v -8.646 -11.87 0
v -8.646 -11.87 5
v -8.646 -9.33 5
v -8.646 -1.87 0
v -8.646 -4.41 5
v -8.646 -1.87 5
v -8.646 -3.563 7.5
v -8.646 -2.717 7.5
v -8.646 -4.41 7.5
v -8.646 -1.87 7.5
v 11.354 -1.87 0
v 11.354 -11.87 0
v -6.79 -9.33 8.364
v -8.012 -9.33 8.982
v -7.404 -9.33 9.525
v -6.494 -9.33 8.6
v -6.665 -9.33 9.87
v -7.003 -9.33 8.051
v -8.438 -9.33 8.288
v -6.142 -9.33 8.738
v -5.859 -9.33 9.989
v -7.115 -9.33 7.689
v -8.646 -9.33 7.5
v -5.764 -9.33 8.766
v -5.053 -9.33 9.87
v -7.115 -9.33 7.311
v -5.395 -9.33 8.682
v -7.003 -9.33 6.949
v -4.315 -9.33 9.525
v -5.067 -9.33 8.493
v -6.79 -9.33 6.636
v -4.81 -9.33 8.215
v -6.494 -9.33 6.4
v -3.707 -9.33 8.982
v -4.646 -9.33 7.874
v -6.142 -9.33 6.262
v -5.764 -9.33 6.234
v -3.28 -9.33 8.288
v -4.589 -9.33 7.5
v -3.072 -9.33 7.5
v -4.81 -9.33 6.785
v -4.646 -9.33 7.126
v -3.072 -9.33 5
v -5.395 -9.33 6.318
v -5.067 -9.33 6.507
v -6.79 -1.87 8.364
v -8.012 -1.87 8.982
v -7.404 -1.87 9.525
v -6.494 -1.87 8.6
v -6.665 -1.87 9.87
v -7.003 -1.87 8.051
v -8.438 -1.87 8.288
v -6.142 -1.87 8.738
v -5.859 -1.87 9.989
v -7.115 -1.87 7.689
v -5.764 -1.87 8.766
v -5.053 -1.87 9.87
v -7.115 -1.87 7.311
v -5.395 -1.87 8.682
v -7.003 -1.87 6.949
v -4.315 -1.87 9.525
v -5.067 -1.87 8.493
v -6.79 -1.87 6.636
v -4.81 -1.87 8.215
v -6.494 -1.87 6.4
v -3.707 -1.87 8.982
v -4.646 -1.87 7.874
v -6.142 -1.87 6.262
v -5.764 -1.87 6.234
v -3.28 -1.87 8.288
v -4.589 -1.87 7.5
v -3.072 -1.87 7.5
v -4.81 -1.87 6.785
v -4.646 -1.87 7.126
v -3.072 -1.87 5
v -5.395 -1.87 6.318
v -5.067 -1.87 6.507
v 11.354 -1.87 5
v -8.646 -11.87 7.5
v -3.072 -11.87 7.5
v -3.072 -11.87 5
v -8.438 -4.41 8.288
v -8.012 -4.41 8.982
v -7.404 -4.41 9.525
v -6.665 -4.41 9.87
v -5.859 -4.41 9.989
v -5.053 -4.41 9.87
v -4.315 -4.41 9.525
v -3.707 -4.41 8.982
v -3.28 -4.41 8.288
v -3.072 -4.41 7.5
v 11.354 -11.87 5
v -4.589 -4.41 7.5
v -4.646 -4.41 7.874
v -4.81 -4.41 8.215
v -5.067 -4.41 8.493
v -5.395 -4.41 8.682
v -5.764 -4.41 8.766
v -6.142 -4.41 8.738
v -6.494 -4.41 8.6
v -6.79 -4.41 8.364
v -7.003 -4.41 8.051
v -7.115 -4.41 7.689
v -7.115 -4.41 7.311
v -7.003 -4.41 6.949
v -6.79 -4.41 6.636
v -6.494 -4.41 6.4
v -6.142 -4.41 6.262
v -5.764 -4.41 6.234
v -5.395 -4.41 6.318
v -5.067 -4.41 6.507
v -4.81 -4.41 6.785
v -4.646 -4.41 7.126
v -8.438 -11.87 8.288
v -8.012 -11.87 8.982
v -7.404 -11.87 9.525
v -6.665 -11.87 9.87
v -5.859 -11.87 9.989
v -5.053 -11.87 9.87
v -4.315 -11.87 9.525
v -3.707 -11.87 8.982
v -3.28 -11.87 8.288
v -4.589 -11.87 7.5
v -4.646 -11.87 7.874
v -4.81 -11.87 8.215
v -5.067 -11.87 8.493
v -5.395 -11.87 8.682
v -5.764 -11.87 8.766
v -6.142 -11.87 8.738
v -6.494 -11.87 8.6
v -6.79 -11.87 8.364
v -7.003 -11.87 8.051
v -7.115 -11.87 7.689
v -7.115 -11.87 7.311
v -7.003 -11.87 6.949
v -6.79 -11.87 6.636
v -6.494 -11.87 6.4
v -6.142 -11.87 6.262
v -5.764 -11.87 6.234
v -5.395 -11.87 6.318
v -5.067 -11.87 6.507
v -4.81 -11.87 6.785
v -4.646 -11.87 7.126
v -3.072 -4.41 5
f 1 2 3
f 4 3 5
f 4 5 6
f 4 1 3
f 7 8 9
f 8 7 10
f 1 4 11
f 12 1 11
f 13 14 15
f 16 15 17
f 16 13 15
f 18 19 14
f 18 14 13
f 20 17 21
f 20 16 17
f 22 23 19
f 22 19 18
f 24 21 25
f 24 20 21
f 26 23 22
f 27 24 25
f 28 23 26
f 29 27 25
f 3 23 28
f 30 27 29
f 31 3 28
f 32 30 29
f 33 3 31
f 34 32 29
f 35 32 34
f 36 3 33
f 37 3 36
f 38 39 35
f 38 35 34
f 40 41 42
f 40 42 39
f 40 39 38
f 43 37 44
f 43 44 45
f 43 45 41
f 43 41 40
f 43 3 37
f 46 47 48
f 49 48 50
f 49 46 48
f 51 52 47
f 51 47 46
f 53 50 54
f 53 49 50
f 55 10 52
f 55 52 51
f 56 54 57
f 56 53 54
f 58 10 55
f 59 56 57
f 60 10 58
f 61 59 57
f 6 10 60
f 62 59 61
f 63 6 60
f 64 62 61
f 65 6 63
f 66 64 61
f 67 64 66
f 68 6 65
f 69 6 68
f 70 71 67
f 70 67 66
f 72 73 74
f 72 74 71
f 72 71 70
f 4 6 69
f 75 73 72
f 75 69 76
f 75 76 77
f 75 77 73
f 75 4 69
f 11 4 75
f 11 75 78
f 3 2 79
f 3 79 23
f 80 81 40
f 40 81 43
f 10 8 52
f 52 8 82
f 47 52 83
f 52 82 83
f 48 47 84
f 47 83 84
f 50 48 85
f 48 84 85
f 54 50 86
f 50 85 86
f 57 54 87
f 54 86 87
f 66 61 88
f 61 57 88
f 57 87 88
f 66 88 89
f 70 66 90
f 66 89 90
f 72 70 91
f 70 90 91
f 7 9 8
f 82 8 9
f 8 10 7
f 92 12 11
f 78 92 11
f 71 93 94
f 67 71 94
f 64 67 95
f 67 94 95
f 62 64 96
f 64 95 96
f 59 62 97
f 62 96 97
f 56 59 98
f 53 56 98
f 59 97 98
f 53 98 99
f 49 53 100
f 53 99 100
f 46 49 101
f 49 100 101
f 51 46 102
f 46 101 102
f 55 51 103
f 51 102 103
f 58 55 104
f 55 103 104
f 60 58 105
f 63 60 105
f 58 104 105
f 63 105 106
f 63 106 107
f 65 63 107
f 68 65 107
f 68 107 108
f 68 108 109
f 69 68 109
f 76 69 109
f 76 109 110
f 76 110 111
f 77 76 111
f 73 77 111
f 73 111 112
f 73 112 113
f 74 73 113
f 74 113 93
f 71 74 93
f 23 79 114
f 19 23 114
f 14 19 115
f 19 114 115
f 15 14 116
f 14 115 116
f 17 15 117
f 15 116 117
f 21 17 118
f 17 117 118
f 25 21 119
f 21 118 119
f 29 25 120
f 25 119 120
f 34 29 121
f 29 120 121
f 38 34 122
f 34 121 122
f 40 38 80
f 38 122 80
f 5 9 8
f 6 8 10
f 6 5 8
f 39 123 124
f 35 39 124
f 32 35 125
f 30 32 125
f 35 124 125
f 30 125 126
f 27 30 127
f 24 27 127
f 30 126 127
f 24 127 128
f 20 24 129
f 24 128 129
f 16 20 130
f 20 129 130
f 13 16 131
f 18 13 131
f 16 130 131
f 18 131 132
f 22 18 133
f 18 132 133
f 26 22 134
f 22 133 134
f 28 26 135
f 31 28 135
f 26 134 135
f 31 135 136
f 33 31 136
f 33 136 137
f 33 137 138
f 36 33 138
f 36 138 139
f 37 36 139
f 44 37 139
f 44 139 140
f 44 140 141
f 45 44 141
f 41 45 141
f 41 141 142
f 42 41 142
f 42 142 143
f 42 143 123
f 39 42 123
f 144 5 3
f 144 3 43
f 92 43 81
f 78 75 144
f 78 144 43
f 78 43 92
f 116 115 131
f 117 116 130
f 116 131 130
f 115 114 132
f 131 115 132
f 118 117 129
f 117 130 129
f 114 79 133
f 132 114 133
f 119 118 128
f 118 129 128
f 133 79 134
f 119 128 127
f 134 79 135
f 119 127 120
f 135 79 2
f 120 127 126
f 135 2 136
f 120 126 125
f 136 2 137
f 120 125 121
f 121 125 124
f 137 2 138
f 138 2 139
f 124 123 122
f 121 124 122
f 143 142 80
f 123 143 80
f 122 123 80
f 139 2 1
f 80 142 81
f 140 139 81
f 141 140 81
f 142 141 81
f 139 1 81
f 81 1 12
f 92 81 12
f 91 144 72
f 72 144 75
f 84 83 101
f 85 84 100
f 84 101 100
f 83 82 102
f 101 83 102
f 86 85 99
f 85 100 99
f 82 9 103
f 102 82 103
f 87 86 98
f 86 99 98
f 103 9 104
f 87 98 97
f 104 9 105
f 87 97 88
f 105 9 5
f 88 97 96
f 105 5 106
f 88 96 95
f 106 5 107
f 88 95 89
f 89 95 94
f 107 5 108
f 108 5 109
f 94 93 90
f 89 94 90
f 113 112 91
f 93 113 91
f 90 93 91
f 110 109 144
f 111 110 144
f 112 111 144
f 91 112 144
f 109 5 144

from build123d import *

# Parameters (mm, degrees)
F0_W     = 20
F0_H     = 10
F1_DEPTH = 5
F2_W     = 5.574685
F2_H     = 2.54
F3_DEPTH = 5
F5_DEPTH = 10.001
F6_R     = 1.27
F7_DEPTH = 10.001


with BuildPart() as f1:
    # F0 (on Top) → F1 (new body)
    with BuildSketch(Plane.XY):
        with Locations((1.353551, -6.869877)):
            Rectangle(F0_W, F0_H)
    extrude(amount=F1_DEPTH)

    # F2 (on face) → F3 (join)
    with BuildSketch(Plane.XY.offset(5)):
        with Locations((-5.859107, -3.139877)):
            Rectangle(F2_W, F2_H)
        with Locations((-5.859107, -10.599877)):
            Rectangle(F2_W, F2_H)
    extrude(amount=F3_DEPTH)

    # F4 (on face) → F5 (cut, through all)
    with BuildSketch(Plane.XZ.offset(11.869877)):
        Polygon((-3.071764, 10), (-3.071764, 7.5), (-2.419111, 7.5), (-2.419111, 10.895025), (-9.260142, 10.895025), (-9.729625, 7.921636), (-8.646449, 7.5), (-8.646449, 10), align=None)
        with BuildLine():
            ThreePointArc((-8.646449, 7.5), (-5.859107, 9.988526), (-3.071764, 7.5))
            Line((-3.071764, 7.5), (-3.071764, 10))
            Line((-3.071764, 10), (-8.646449, 10))
            Line((-8.646449, 10), (-8.646449, 7.5))
        make_face()
    extrude(amount=-F5_DEPTH, mode=Mode.SUBTRACT)

    # F6 (on face) → F7 (cut, through all)
    with BuildSketch(Plane.XZ.offset(11.869877)):
        with Locations((-5.859107, 7.5)):
            Circle(F6_R)
    extrude(amount=-F7_DEPTH, mode=Mode.SUBTRACT)


solid = f1.part
